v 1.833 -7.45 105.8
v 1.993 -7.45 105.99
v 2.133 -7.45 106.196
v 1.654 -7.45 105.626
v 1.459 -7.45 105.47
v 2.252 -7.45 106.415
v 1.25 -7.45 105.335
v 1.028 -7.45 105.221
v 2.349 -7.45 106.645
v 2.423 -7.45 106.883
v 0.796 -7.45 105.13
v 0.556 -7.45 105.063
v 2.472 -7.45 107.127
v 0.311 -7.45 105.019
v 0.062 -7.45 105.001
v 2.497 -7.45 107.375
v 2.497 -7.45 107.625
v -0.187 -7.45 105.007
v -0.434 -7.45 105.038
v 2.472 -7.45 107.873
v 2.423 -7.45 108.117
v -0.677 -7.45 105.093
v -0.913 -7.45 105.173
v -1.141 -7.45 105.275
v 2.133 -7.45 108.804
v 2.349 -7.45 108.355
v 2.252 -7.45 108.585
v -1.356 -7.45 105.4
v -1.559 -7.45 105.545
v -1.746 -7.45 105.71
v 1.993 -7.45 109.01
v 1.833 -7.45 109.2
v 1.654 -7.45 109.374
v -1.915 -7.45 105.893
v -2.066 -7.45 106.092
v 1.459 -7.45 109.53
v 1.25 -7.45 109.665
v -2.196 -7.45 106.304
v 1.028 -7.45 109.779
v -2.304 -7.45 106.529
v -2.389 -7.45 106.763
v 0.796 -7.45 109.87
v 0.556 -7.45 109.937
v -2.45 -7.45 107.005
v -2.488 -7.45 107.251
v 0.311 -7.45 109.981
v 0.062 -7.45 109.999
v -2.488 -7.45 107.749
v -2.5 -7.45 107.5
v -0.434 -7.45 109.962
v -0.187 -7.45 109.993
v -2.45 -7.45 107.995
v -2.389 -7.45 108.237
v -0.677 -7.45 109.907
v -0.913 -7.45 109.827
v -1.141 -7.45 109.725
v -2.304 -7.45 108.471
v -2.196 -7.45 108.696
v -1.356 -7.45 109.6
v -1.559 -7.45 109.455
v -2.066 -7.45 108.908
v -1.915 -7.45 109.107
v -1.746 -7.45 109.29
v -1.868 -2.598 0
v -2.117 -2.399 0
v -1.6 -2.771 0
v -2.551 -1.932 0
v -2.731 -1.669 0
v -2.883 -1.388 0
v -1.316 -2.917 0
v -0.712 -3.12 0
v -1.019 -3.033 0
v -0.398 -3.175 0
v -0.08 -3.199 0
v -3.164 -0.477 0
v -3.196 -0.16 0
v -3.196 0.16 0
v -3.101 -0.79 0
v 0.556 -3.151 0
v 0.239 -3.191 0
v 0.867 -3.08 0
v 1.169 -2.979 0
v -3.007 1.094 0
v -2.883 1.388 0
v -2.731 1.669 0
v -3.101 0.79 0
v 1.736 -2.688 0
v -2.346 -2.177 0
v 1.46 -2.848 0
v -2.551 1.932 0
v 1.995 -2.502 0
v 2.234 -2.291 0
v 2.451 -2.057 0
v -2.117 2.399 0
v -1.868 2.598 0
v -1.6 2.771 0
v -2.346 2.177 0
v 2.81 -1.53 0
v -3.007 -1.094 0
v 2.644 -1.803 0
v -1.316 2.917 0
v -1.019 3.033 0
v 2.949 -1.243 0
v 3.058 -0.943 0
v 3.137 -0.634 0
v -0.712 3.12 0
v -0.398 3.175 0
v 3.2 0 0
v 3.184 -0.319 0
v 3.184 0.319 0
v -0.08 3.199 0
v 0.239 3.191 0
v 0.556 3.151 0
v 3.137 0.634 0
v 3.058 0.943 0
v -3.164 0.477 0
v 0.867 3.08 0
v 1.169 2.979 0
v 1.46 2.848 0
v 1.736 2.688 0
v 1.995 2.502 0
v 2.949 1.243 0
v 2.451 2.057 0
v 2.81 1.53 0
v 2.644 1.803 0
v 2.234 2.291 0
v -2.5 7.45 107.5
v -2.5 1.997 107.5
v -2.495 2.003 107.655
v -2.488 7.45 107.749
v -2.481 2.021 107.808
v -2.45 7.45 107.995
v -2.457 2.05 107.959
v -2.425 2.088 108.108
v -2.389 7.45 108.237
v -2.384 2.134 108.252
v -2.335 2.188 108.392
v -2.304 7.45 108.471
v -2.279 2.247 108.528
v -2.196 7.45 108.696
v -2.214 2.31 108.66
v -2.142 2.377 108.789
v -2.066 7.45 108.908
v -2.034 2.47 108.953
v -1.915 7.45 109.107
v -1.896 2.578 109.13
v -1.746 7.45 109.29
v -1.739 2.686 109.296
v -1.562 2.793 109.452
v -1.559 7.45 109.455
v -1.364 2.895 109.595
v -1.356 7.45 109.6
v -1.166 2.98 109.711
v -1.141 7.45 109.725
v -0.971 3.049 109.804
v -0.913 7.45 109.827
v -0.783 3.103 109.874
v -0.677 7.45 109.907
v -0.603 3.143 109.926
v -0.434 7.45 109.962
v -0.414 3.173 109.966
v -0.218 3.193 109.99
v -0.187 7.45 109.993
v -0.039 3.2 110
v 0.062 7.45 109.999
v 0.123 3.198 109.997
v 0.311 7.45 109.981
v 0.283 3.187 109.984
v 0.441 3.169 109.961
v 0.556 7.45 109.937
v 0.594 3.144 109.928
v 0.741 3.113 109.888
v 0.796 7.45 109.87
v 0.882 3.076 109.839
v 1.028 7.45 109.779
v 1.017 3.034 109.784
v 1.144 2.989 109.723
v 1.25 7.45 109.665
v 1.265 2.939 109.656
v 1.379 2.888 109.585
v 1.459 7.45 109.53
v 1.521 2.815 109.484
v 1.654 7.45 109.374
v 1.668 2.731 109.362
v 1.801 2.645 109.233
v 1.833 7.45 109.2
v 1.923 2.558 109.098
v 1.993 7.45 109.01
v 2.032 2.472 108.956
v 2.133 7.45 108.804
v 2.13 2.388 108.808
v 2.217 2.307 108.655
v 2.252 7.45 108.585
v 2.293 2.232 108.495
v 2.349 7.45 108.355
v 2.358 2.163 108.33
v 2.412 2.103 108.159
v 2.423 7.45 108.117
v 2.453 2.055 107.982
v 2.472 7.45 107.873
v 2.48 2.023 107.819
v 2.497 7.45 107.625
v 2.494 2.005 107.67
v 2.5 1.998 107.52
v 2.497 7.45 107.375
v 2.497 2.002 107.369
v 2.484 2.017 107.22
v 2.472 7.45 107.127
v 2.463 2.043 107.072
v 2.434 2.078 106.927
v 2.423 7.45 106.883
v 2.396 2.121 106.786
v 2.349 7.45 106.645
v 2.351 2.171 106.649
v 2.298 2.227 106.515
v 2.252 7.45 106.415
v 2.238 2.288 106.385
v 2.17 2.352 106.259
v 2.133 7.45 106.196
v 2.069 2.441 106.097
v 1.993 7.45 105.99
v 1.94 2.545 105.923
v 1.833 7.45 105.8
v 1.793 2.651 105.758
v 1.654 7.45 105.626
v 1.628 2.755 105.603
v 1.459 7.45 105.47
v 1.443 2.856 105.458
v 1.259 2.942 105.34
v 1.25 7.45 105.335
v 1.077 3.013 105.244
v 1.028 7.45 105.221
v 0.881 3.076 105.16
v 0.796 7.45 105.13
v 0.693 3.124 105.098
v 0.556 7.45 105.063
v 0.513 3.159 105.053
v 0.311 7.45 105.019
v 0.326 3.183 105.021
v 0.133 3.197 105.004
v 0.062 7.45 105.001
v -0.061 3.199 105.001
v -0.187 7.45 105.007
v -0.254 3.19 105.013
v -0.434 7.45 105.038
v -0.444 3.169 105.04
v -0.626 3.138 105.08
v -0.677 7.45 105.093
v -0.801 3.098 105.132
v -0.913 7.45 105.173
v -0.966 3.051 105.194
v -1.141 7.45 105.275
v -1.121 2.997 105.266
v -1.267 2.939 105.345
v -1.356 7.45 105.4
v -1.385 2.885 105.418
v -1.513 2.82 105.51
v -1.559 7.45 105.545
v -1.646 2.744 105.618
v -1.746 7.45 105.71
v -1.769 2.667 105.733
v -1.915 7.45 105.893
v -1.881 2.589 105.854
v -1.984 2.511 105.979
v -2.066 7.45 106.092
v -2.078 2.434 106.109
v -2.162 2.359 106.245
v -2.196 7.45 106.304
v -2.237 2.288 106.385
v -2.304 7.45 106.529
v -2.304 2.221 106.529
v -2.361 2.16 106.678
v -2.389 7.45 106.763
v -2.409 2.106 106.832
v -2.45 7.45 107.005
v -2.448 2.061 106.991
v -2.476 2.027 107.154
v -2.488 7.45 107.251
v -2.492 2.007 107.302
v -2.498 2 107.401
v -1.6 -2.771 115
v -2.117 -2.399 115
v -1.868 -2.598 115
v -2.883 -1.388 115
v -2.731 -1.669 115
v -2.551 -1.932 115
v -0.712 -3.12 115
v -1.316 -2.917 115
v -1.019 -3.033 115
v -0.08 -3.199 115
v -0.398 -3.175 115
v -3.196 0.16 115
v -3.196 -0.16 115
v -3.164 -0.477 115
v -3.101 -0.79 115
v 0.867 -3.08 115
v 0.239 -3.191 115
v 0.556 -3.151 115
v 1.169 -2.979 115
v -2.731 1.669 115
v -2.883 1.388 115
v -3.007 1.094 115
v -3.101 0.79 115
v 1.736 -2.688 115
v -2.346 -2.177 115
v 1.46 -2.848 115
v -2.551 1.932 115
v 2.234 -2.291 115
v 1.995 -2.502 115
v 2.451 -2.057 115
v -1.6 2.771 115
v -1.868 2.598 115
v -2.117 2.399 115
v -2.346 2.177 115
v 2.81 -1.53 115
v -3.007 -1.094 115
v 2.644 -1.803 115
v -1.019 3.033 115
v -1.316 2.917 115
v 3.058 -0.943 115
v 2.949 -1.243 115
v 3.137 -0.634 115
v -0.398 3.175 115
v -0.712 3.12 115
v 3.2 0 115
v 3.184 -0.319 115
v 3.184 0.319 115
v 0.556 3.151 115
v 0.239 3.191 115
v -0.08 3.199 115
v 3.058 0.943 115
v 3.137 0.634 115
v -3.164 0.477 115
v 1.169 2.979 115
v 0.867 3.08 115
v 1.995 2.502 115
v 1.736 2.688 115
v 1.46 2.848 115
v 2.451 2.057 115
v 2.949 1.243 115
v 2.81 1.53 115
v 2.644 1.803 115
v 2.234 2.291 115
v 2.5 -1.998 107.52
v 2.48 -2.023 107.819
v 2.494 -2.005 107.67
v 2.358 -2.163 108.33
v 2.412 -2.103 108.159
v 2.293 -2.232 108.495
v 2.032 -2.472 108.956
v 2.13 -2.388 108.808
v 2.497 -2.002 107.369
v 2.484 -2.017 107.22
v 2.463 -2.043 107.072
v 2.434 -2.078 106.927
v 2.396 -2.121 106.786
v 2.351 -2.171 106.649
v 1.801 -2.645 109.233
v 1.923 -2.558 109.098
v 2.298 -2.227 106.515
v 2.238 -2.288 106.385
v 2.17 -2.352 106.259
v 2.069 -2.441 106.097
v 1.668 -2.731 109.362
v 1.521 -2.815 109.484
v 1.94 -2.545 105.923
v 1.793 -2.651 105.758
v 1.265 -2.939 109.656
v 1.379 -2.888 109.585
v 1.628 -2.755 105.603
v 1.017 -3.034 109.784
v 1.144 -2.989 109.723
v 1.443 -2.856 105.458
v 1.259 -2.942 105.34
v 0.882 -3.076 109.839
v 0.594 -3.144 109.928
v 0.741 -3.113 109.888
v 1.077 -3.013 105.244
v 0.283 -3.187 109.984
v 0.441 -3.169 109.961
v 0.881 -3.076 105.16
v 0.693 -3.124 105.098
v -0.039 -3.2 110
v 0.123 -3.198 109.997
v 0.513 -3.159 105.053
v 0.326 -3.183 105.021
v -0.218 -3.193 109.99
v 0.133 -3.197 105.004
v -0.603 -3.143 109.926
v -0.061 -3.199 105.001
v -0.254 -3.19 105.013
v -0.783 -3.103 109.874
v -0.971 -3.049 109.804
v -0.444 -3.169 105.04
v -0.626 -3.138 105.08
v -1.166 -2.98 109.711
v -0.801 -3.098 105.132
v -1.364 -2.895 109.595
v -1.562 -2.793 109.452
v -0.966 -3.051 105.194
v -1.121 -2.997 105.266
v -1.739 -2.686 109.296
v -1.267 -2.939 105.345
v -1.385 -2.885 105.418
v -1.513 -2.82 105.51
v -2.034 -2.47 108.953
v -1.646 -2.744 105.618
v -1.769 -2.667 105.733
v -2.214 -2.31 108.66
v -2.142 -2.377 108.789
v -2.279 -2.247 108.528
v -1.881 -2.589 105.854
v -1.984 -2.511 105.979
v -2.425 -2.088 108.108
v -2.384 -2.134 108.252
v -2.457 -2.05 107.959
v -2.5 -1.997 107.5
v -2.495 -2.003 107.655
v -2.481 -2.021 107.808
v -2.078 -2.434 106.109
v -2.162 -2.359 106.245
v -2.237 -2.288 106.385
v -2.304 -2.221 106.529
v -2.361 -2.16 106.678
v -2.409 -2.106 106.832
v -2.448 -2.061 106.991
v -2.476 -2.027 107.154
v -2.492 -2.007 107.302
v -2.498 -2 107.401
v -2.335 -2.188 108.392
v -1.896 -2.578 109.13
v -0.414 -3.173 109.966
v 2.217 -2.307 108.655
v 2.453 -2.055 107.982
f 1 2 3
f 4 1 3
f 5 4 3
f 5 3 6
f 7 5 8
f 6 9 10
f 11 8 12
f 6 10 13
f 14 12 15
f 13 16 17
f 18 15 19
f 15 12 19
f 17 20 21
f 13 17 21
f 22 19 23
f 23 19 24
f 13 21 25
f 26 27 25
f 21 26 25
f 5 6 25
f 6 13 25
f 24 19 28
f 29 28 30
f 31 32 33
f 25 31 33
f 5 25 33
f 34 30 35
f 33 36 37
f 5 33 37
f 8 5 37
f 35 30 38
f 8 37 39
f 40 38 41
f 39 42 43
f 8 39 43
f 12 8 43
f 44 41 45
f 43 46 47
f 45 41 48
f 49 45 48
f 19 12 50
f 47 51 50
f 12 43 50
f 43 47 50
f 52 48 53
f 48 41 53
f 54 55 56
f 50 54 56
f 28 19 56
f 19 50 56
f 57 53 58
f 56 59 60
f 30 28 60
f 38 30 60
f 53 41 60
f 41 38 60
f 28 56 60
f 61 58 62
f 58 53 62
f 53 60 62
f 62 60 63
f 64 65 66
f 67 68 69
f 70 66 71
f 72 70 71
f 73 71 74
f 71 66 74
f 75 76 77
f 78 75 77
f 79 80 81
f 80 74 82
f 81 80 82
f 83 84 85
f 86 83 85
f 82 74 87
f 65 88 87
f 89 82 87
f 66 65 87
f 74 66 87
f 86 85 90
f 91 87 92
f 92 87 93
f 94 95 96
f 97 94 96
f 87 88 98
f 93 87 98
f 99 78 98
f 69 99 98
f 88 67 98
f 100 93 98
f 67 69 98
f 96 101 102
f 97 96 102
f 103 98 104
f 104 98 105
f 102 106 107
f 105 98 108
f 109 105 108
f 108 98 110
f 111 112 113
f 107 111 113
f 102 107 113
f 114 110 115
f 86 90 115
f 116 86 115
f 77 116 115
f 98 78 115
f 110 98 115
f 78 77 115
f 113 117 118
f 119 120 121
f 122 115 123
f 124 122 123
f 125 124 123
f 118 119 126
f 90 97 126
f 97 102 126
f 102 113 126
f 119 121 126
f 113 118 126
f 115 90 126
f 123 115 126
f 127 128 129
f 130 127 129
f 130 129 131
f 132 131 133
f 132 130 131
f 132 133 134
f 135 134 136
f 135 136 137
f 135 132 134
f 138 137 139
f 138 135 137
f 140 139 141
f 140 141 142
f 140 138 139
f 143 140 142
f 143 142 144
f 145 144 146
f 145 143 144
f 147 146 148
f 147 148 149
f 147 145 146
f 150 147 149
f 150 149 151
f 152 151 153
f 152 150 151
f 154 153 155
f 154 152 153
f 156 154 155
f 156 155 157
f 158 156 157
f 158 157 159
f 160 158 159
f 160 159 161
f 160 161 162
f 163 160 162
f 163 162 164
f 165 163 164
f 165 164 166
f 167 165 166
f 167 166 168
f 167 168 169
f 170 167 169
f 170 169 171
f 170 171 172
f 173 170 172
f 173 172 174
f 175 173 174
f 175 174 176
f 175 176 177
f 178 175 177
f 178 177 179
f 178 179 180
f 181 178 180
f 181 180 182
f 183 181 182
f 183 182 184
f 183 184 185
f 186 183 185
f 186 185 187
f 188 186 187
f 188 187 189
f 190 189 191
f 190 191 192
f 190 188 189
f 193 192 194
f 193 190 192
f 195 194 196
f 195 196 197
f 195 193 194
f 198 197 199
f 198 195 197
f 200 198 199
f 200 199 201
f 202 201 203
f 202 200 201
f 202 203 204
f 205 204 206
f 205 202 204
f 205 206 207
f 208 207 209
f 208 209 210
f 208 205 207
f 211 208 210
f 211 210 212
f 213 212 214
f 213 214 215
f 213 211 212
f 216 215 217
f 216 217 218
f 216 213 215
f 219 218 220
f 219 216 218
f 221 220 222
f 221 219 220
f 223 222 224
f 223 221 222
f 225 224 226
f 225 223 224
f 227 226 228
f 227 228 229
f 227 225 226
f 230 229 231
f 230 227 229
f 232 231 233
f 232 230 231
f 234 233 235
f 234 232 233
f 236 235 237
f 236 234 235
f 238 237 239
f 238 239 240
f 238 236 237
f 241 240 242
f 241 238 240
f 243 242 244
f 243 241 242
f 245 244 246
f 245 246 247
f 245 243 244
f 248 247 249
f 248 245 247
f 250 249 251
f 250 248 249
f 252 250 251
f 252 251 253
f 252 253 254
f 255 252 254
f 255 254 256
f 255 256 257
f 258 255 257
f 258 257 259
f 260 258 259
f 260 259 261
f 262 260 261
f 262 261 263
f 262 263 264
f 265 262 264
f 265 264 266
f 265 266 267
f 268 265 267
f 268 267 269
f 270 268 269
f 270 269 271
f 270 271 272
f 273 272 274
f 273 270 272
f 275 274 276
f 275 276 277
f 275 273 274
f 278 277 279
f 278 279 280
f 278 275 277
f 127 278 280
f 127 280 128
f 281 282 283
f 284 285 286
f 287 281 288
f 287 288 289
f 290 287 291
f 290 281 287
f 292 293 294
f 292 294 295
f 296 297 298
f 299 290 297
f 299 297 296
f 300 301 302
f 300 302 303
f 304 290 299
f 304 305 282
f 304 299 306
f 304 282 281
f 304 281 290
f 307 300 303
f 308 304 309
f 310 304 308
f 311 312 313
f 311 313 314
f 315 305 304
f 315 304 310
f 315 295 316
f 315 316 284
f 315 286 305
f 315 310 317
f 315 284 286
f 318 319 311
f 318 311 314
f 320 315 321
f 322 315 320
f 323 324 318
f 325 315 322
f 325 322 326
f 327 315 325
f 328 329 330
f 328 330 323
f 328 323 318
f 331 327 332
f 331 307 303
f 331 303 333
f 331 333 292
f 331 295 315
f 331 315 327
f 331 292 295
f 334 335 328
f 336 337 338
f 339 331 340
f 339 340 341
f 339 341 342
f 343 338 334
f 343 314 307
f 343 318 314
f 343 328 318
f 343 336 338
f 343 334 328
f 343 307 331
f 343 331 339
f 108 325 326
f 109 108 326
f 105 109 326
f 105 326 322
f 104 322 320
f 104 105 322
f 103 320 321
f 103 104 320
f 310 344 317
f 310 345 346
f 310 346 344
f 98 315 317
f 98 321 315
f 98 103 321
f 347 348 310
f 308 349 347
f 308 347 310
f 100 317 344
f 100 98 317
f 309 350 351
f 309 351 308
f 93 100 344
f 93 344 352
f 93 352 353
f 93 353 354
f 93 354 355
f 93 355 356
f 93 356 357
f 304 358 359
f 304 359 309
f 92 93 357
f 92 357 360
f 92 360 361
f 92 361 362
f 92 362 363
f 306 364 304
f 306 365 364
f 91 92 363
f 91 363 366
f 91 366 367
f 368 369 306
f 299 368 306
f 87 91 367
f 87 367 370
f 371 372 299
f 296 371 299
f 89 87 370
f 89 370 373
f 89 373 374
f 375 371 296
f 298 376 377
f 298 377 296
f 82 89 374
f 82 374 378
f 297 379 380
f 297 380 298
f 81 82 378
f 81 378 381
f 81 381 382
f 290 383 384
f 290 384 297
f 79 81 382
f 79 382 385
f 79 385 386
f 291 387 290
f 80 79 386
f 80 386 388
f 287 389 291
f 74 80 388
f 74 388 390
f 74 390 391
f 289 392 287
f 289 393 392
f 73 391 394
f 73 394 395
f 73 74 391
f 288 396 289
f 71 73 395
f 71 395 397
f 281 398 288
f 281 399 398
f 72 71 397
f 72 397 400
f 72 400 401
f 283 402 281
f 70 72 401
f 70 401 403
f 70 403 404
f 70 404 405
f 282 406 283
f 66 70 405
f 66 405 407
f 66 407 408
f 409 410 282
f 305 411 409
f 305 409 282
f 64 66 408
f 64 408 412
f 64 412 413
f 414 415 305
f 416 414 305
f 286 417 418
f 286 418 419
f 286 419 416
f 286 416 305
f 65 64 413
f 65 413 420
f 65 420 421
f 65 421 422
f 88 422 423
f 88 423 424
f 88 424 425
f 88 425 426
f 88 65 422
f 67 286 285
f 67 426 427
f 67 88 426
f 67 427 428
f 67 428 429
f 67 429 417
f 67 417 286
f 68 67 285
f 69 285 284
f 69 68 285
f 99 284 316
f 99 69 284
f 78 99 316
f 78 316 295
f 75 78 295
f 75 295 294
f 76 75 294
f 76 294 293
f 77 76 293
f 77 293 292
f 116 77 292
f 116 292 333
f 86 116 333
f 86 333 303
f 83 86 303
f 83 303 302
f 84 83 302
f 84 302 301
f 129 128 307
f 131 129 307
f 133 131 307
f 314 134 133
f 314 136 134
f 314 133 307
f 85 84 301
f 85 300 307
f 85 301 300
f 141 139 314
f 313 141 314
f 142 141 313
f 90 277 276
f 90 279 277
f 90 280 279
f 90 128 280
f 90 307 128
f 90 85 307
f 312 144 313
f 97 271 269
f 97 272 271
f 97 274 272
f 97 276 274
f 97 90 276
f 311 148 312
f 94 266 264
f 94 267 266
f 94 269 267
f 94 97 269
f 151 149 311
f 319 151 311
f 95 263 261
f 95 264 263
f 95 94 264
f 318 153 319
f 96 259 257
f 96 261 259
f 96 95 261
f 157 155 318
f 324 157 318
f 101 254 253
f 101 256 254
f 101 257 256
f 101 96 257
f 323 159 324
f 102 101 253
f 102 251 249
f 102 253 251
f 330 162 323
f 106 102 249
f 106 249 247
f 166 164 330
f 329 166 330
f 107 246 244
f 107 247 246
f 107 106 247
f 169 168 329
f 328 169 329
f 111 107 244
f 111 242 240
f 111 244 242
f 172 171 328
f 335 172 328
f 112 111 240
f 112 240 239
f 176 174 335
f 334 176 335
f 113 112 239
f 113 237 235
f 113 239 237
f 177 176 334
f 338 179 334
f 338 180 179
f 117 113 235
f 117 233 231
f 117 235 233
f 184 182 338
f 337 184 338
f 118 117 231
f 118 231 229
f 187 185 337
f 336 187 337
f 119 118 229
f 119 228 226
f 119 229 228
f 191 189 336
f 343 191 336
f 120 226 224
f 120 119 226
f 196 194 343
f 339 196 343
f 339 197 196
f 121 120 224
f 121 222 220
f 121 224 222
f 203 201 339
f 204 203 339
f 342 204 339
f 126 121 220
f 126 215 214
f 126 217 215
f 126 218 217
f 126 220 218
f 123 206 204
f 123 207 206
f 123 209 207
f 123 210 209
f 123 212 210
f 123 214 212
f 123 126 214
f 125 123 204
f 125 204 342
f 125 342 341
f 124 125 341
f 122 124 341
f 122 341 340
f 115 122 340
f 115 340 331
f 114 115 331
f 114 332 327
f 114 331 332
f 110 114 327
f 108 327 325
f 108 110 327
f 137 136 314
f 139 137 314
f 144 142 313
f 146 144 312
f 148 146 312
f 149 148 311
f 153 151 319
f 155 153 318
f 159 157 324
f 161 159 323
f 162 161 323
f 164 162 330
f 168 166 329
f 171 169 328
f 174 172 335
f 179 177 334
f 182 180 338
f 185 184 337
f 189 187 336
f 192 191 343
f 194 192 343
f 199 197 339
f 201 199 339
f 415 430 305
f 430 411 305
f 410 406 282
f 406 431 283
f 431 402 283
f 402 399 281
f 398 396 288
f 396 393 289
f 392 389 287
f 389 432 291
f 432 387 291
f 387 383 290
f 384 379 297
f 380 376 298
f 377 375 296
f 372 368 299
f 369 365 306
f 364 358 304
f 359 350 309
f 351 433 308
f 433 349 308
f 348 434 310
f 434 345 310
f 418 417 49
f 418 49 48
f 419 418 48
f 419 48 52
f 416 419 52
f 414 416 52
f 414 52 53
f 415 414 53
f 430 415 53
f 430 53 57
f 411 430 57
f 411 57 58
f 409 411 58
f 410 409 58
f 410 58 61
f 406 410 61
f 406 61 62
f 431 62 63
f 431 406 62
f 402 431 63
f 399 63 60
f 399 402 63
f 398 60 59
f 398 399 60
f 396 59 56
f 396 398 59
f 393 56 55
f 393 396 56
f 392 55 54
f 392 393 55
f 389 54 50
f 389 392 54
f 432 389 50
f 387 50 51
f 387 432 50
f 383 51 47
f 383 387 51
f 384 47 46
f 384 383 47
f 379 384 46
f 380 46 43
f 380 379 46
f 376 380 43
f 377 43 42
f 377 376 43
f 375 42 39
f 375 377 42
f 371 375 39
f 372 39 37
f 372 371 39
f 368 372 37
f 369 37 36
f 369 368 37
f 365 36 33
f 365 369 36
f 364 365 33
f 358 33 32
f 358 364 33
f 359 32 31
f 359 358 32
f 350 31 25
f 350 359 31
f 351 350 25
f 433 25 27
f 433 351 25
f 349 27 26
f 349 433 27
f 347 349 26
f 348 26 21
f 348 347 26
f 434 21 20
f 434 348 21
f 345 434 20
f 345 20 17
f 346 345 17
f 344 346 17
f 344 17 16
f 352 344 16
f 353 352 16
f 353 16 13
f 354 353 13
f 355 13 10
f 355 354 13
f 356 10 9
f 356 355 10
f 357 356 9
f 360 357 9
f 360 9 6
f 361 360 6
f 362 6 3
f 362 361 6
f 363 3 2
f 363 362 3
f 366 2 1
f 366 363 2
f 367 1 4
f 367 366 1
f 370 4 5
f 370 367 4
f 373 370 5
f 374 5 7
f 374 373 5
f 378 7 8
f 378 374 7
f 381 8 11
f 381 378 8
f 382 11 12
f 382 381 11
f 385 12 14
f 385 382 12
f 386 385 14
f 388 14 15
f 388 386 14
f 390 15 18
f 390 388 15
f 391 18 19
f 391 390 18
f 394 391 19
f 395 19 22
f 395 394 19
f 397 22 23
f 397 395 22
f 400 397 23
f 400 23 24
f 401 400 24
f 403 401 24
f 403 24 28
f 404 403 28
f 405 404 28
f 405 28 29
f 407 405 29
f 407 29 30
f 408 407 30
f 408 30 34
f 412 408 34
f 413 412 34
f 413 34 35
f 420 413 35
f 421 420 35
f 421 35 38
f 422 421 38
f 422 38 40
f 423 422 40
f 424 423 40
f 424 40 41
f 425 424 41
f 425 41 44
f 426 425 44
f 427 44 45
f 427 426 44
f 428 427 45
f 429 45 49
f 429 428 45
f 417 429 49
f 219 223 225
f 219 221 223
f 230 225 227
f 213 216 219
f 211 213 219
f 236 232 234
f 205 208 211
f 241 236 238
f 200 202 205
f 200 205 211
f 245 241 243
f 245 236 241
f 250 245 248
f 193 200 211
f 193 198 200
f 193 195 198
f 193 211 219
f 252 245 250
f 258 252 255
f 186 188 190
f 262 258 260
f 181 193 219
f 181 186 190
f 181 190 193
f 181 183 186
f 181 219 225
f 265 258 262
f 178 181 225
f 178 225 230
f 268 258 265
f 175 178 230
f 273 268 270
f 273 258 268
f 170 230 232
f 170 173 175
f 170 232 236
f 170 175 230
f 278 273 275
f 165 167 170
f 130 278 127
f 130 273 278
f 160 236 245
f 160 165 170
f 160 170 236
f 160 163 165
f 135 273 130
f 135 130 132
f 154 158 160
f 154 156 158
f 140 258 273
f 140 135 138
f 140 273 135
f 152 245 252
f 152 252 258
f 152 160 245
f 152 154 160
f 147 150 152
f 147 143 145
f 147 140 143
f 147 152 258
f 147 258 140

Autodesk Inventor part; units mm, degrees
ref_plane "YZ Plane" through (0, 0, 0) normal (1, 0, 0) x (0, 1, 0)
ref_plane "XY Plane" through (0, 0, 0) normal (0, 0, 1) x (1, 0, 0)
sketch "Sketch1" plane through (0, 0, 0) normal (0, 0, 1) x (1, 0, 0)
  circle A0 centre (0, 0) radius 3.2
  dimension "d0" = 6.4
extrude "Extrusion1" add sketch "Sketch1" along normal blind 115
ref_plane "Work Plane1" through (0, 3.2, 0) normal (0, 1, 0) x (-1, 0, 0)
sketch "Sketch2" plane through (0, 3.2, 0) normal (0, 1, 0) x (-1, 0, 0)
  line L0 (0, -23) -> (0, 138) projected
  circle A0 centre (0, 107.5) radius 2.5
  line L1 (3.2, 115) -> (-3.2, 115) projected
  point P0 (0, 0)
  dimension "d11" = 5
  dimension "d12" = 7.5
extrude "Extrusion2" add sketch "Sketch2" along normal blind 4.25 and the other way blind 10.65
properties part number "Handle"
